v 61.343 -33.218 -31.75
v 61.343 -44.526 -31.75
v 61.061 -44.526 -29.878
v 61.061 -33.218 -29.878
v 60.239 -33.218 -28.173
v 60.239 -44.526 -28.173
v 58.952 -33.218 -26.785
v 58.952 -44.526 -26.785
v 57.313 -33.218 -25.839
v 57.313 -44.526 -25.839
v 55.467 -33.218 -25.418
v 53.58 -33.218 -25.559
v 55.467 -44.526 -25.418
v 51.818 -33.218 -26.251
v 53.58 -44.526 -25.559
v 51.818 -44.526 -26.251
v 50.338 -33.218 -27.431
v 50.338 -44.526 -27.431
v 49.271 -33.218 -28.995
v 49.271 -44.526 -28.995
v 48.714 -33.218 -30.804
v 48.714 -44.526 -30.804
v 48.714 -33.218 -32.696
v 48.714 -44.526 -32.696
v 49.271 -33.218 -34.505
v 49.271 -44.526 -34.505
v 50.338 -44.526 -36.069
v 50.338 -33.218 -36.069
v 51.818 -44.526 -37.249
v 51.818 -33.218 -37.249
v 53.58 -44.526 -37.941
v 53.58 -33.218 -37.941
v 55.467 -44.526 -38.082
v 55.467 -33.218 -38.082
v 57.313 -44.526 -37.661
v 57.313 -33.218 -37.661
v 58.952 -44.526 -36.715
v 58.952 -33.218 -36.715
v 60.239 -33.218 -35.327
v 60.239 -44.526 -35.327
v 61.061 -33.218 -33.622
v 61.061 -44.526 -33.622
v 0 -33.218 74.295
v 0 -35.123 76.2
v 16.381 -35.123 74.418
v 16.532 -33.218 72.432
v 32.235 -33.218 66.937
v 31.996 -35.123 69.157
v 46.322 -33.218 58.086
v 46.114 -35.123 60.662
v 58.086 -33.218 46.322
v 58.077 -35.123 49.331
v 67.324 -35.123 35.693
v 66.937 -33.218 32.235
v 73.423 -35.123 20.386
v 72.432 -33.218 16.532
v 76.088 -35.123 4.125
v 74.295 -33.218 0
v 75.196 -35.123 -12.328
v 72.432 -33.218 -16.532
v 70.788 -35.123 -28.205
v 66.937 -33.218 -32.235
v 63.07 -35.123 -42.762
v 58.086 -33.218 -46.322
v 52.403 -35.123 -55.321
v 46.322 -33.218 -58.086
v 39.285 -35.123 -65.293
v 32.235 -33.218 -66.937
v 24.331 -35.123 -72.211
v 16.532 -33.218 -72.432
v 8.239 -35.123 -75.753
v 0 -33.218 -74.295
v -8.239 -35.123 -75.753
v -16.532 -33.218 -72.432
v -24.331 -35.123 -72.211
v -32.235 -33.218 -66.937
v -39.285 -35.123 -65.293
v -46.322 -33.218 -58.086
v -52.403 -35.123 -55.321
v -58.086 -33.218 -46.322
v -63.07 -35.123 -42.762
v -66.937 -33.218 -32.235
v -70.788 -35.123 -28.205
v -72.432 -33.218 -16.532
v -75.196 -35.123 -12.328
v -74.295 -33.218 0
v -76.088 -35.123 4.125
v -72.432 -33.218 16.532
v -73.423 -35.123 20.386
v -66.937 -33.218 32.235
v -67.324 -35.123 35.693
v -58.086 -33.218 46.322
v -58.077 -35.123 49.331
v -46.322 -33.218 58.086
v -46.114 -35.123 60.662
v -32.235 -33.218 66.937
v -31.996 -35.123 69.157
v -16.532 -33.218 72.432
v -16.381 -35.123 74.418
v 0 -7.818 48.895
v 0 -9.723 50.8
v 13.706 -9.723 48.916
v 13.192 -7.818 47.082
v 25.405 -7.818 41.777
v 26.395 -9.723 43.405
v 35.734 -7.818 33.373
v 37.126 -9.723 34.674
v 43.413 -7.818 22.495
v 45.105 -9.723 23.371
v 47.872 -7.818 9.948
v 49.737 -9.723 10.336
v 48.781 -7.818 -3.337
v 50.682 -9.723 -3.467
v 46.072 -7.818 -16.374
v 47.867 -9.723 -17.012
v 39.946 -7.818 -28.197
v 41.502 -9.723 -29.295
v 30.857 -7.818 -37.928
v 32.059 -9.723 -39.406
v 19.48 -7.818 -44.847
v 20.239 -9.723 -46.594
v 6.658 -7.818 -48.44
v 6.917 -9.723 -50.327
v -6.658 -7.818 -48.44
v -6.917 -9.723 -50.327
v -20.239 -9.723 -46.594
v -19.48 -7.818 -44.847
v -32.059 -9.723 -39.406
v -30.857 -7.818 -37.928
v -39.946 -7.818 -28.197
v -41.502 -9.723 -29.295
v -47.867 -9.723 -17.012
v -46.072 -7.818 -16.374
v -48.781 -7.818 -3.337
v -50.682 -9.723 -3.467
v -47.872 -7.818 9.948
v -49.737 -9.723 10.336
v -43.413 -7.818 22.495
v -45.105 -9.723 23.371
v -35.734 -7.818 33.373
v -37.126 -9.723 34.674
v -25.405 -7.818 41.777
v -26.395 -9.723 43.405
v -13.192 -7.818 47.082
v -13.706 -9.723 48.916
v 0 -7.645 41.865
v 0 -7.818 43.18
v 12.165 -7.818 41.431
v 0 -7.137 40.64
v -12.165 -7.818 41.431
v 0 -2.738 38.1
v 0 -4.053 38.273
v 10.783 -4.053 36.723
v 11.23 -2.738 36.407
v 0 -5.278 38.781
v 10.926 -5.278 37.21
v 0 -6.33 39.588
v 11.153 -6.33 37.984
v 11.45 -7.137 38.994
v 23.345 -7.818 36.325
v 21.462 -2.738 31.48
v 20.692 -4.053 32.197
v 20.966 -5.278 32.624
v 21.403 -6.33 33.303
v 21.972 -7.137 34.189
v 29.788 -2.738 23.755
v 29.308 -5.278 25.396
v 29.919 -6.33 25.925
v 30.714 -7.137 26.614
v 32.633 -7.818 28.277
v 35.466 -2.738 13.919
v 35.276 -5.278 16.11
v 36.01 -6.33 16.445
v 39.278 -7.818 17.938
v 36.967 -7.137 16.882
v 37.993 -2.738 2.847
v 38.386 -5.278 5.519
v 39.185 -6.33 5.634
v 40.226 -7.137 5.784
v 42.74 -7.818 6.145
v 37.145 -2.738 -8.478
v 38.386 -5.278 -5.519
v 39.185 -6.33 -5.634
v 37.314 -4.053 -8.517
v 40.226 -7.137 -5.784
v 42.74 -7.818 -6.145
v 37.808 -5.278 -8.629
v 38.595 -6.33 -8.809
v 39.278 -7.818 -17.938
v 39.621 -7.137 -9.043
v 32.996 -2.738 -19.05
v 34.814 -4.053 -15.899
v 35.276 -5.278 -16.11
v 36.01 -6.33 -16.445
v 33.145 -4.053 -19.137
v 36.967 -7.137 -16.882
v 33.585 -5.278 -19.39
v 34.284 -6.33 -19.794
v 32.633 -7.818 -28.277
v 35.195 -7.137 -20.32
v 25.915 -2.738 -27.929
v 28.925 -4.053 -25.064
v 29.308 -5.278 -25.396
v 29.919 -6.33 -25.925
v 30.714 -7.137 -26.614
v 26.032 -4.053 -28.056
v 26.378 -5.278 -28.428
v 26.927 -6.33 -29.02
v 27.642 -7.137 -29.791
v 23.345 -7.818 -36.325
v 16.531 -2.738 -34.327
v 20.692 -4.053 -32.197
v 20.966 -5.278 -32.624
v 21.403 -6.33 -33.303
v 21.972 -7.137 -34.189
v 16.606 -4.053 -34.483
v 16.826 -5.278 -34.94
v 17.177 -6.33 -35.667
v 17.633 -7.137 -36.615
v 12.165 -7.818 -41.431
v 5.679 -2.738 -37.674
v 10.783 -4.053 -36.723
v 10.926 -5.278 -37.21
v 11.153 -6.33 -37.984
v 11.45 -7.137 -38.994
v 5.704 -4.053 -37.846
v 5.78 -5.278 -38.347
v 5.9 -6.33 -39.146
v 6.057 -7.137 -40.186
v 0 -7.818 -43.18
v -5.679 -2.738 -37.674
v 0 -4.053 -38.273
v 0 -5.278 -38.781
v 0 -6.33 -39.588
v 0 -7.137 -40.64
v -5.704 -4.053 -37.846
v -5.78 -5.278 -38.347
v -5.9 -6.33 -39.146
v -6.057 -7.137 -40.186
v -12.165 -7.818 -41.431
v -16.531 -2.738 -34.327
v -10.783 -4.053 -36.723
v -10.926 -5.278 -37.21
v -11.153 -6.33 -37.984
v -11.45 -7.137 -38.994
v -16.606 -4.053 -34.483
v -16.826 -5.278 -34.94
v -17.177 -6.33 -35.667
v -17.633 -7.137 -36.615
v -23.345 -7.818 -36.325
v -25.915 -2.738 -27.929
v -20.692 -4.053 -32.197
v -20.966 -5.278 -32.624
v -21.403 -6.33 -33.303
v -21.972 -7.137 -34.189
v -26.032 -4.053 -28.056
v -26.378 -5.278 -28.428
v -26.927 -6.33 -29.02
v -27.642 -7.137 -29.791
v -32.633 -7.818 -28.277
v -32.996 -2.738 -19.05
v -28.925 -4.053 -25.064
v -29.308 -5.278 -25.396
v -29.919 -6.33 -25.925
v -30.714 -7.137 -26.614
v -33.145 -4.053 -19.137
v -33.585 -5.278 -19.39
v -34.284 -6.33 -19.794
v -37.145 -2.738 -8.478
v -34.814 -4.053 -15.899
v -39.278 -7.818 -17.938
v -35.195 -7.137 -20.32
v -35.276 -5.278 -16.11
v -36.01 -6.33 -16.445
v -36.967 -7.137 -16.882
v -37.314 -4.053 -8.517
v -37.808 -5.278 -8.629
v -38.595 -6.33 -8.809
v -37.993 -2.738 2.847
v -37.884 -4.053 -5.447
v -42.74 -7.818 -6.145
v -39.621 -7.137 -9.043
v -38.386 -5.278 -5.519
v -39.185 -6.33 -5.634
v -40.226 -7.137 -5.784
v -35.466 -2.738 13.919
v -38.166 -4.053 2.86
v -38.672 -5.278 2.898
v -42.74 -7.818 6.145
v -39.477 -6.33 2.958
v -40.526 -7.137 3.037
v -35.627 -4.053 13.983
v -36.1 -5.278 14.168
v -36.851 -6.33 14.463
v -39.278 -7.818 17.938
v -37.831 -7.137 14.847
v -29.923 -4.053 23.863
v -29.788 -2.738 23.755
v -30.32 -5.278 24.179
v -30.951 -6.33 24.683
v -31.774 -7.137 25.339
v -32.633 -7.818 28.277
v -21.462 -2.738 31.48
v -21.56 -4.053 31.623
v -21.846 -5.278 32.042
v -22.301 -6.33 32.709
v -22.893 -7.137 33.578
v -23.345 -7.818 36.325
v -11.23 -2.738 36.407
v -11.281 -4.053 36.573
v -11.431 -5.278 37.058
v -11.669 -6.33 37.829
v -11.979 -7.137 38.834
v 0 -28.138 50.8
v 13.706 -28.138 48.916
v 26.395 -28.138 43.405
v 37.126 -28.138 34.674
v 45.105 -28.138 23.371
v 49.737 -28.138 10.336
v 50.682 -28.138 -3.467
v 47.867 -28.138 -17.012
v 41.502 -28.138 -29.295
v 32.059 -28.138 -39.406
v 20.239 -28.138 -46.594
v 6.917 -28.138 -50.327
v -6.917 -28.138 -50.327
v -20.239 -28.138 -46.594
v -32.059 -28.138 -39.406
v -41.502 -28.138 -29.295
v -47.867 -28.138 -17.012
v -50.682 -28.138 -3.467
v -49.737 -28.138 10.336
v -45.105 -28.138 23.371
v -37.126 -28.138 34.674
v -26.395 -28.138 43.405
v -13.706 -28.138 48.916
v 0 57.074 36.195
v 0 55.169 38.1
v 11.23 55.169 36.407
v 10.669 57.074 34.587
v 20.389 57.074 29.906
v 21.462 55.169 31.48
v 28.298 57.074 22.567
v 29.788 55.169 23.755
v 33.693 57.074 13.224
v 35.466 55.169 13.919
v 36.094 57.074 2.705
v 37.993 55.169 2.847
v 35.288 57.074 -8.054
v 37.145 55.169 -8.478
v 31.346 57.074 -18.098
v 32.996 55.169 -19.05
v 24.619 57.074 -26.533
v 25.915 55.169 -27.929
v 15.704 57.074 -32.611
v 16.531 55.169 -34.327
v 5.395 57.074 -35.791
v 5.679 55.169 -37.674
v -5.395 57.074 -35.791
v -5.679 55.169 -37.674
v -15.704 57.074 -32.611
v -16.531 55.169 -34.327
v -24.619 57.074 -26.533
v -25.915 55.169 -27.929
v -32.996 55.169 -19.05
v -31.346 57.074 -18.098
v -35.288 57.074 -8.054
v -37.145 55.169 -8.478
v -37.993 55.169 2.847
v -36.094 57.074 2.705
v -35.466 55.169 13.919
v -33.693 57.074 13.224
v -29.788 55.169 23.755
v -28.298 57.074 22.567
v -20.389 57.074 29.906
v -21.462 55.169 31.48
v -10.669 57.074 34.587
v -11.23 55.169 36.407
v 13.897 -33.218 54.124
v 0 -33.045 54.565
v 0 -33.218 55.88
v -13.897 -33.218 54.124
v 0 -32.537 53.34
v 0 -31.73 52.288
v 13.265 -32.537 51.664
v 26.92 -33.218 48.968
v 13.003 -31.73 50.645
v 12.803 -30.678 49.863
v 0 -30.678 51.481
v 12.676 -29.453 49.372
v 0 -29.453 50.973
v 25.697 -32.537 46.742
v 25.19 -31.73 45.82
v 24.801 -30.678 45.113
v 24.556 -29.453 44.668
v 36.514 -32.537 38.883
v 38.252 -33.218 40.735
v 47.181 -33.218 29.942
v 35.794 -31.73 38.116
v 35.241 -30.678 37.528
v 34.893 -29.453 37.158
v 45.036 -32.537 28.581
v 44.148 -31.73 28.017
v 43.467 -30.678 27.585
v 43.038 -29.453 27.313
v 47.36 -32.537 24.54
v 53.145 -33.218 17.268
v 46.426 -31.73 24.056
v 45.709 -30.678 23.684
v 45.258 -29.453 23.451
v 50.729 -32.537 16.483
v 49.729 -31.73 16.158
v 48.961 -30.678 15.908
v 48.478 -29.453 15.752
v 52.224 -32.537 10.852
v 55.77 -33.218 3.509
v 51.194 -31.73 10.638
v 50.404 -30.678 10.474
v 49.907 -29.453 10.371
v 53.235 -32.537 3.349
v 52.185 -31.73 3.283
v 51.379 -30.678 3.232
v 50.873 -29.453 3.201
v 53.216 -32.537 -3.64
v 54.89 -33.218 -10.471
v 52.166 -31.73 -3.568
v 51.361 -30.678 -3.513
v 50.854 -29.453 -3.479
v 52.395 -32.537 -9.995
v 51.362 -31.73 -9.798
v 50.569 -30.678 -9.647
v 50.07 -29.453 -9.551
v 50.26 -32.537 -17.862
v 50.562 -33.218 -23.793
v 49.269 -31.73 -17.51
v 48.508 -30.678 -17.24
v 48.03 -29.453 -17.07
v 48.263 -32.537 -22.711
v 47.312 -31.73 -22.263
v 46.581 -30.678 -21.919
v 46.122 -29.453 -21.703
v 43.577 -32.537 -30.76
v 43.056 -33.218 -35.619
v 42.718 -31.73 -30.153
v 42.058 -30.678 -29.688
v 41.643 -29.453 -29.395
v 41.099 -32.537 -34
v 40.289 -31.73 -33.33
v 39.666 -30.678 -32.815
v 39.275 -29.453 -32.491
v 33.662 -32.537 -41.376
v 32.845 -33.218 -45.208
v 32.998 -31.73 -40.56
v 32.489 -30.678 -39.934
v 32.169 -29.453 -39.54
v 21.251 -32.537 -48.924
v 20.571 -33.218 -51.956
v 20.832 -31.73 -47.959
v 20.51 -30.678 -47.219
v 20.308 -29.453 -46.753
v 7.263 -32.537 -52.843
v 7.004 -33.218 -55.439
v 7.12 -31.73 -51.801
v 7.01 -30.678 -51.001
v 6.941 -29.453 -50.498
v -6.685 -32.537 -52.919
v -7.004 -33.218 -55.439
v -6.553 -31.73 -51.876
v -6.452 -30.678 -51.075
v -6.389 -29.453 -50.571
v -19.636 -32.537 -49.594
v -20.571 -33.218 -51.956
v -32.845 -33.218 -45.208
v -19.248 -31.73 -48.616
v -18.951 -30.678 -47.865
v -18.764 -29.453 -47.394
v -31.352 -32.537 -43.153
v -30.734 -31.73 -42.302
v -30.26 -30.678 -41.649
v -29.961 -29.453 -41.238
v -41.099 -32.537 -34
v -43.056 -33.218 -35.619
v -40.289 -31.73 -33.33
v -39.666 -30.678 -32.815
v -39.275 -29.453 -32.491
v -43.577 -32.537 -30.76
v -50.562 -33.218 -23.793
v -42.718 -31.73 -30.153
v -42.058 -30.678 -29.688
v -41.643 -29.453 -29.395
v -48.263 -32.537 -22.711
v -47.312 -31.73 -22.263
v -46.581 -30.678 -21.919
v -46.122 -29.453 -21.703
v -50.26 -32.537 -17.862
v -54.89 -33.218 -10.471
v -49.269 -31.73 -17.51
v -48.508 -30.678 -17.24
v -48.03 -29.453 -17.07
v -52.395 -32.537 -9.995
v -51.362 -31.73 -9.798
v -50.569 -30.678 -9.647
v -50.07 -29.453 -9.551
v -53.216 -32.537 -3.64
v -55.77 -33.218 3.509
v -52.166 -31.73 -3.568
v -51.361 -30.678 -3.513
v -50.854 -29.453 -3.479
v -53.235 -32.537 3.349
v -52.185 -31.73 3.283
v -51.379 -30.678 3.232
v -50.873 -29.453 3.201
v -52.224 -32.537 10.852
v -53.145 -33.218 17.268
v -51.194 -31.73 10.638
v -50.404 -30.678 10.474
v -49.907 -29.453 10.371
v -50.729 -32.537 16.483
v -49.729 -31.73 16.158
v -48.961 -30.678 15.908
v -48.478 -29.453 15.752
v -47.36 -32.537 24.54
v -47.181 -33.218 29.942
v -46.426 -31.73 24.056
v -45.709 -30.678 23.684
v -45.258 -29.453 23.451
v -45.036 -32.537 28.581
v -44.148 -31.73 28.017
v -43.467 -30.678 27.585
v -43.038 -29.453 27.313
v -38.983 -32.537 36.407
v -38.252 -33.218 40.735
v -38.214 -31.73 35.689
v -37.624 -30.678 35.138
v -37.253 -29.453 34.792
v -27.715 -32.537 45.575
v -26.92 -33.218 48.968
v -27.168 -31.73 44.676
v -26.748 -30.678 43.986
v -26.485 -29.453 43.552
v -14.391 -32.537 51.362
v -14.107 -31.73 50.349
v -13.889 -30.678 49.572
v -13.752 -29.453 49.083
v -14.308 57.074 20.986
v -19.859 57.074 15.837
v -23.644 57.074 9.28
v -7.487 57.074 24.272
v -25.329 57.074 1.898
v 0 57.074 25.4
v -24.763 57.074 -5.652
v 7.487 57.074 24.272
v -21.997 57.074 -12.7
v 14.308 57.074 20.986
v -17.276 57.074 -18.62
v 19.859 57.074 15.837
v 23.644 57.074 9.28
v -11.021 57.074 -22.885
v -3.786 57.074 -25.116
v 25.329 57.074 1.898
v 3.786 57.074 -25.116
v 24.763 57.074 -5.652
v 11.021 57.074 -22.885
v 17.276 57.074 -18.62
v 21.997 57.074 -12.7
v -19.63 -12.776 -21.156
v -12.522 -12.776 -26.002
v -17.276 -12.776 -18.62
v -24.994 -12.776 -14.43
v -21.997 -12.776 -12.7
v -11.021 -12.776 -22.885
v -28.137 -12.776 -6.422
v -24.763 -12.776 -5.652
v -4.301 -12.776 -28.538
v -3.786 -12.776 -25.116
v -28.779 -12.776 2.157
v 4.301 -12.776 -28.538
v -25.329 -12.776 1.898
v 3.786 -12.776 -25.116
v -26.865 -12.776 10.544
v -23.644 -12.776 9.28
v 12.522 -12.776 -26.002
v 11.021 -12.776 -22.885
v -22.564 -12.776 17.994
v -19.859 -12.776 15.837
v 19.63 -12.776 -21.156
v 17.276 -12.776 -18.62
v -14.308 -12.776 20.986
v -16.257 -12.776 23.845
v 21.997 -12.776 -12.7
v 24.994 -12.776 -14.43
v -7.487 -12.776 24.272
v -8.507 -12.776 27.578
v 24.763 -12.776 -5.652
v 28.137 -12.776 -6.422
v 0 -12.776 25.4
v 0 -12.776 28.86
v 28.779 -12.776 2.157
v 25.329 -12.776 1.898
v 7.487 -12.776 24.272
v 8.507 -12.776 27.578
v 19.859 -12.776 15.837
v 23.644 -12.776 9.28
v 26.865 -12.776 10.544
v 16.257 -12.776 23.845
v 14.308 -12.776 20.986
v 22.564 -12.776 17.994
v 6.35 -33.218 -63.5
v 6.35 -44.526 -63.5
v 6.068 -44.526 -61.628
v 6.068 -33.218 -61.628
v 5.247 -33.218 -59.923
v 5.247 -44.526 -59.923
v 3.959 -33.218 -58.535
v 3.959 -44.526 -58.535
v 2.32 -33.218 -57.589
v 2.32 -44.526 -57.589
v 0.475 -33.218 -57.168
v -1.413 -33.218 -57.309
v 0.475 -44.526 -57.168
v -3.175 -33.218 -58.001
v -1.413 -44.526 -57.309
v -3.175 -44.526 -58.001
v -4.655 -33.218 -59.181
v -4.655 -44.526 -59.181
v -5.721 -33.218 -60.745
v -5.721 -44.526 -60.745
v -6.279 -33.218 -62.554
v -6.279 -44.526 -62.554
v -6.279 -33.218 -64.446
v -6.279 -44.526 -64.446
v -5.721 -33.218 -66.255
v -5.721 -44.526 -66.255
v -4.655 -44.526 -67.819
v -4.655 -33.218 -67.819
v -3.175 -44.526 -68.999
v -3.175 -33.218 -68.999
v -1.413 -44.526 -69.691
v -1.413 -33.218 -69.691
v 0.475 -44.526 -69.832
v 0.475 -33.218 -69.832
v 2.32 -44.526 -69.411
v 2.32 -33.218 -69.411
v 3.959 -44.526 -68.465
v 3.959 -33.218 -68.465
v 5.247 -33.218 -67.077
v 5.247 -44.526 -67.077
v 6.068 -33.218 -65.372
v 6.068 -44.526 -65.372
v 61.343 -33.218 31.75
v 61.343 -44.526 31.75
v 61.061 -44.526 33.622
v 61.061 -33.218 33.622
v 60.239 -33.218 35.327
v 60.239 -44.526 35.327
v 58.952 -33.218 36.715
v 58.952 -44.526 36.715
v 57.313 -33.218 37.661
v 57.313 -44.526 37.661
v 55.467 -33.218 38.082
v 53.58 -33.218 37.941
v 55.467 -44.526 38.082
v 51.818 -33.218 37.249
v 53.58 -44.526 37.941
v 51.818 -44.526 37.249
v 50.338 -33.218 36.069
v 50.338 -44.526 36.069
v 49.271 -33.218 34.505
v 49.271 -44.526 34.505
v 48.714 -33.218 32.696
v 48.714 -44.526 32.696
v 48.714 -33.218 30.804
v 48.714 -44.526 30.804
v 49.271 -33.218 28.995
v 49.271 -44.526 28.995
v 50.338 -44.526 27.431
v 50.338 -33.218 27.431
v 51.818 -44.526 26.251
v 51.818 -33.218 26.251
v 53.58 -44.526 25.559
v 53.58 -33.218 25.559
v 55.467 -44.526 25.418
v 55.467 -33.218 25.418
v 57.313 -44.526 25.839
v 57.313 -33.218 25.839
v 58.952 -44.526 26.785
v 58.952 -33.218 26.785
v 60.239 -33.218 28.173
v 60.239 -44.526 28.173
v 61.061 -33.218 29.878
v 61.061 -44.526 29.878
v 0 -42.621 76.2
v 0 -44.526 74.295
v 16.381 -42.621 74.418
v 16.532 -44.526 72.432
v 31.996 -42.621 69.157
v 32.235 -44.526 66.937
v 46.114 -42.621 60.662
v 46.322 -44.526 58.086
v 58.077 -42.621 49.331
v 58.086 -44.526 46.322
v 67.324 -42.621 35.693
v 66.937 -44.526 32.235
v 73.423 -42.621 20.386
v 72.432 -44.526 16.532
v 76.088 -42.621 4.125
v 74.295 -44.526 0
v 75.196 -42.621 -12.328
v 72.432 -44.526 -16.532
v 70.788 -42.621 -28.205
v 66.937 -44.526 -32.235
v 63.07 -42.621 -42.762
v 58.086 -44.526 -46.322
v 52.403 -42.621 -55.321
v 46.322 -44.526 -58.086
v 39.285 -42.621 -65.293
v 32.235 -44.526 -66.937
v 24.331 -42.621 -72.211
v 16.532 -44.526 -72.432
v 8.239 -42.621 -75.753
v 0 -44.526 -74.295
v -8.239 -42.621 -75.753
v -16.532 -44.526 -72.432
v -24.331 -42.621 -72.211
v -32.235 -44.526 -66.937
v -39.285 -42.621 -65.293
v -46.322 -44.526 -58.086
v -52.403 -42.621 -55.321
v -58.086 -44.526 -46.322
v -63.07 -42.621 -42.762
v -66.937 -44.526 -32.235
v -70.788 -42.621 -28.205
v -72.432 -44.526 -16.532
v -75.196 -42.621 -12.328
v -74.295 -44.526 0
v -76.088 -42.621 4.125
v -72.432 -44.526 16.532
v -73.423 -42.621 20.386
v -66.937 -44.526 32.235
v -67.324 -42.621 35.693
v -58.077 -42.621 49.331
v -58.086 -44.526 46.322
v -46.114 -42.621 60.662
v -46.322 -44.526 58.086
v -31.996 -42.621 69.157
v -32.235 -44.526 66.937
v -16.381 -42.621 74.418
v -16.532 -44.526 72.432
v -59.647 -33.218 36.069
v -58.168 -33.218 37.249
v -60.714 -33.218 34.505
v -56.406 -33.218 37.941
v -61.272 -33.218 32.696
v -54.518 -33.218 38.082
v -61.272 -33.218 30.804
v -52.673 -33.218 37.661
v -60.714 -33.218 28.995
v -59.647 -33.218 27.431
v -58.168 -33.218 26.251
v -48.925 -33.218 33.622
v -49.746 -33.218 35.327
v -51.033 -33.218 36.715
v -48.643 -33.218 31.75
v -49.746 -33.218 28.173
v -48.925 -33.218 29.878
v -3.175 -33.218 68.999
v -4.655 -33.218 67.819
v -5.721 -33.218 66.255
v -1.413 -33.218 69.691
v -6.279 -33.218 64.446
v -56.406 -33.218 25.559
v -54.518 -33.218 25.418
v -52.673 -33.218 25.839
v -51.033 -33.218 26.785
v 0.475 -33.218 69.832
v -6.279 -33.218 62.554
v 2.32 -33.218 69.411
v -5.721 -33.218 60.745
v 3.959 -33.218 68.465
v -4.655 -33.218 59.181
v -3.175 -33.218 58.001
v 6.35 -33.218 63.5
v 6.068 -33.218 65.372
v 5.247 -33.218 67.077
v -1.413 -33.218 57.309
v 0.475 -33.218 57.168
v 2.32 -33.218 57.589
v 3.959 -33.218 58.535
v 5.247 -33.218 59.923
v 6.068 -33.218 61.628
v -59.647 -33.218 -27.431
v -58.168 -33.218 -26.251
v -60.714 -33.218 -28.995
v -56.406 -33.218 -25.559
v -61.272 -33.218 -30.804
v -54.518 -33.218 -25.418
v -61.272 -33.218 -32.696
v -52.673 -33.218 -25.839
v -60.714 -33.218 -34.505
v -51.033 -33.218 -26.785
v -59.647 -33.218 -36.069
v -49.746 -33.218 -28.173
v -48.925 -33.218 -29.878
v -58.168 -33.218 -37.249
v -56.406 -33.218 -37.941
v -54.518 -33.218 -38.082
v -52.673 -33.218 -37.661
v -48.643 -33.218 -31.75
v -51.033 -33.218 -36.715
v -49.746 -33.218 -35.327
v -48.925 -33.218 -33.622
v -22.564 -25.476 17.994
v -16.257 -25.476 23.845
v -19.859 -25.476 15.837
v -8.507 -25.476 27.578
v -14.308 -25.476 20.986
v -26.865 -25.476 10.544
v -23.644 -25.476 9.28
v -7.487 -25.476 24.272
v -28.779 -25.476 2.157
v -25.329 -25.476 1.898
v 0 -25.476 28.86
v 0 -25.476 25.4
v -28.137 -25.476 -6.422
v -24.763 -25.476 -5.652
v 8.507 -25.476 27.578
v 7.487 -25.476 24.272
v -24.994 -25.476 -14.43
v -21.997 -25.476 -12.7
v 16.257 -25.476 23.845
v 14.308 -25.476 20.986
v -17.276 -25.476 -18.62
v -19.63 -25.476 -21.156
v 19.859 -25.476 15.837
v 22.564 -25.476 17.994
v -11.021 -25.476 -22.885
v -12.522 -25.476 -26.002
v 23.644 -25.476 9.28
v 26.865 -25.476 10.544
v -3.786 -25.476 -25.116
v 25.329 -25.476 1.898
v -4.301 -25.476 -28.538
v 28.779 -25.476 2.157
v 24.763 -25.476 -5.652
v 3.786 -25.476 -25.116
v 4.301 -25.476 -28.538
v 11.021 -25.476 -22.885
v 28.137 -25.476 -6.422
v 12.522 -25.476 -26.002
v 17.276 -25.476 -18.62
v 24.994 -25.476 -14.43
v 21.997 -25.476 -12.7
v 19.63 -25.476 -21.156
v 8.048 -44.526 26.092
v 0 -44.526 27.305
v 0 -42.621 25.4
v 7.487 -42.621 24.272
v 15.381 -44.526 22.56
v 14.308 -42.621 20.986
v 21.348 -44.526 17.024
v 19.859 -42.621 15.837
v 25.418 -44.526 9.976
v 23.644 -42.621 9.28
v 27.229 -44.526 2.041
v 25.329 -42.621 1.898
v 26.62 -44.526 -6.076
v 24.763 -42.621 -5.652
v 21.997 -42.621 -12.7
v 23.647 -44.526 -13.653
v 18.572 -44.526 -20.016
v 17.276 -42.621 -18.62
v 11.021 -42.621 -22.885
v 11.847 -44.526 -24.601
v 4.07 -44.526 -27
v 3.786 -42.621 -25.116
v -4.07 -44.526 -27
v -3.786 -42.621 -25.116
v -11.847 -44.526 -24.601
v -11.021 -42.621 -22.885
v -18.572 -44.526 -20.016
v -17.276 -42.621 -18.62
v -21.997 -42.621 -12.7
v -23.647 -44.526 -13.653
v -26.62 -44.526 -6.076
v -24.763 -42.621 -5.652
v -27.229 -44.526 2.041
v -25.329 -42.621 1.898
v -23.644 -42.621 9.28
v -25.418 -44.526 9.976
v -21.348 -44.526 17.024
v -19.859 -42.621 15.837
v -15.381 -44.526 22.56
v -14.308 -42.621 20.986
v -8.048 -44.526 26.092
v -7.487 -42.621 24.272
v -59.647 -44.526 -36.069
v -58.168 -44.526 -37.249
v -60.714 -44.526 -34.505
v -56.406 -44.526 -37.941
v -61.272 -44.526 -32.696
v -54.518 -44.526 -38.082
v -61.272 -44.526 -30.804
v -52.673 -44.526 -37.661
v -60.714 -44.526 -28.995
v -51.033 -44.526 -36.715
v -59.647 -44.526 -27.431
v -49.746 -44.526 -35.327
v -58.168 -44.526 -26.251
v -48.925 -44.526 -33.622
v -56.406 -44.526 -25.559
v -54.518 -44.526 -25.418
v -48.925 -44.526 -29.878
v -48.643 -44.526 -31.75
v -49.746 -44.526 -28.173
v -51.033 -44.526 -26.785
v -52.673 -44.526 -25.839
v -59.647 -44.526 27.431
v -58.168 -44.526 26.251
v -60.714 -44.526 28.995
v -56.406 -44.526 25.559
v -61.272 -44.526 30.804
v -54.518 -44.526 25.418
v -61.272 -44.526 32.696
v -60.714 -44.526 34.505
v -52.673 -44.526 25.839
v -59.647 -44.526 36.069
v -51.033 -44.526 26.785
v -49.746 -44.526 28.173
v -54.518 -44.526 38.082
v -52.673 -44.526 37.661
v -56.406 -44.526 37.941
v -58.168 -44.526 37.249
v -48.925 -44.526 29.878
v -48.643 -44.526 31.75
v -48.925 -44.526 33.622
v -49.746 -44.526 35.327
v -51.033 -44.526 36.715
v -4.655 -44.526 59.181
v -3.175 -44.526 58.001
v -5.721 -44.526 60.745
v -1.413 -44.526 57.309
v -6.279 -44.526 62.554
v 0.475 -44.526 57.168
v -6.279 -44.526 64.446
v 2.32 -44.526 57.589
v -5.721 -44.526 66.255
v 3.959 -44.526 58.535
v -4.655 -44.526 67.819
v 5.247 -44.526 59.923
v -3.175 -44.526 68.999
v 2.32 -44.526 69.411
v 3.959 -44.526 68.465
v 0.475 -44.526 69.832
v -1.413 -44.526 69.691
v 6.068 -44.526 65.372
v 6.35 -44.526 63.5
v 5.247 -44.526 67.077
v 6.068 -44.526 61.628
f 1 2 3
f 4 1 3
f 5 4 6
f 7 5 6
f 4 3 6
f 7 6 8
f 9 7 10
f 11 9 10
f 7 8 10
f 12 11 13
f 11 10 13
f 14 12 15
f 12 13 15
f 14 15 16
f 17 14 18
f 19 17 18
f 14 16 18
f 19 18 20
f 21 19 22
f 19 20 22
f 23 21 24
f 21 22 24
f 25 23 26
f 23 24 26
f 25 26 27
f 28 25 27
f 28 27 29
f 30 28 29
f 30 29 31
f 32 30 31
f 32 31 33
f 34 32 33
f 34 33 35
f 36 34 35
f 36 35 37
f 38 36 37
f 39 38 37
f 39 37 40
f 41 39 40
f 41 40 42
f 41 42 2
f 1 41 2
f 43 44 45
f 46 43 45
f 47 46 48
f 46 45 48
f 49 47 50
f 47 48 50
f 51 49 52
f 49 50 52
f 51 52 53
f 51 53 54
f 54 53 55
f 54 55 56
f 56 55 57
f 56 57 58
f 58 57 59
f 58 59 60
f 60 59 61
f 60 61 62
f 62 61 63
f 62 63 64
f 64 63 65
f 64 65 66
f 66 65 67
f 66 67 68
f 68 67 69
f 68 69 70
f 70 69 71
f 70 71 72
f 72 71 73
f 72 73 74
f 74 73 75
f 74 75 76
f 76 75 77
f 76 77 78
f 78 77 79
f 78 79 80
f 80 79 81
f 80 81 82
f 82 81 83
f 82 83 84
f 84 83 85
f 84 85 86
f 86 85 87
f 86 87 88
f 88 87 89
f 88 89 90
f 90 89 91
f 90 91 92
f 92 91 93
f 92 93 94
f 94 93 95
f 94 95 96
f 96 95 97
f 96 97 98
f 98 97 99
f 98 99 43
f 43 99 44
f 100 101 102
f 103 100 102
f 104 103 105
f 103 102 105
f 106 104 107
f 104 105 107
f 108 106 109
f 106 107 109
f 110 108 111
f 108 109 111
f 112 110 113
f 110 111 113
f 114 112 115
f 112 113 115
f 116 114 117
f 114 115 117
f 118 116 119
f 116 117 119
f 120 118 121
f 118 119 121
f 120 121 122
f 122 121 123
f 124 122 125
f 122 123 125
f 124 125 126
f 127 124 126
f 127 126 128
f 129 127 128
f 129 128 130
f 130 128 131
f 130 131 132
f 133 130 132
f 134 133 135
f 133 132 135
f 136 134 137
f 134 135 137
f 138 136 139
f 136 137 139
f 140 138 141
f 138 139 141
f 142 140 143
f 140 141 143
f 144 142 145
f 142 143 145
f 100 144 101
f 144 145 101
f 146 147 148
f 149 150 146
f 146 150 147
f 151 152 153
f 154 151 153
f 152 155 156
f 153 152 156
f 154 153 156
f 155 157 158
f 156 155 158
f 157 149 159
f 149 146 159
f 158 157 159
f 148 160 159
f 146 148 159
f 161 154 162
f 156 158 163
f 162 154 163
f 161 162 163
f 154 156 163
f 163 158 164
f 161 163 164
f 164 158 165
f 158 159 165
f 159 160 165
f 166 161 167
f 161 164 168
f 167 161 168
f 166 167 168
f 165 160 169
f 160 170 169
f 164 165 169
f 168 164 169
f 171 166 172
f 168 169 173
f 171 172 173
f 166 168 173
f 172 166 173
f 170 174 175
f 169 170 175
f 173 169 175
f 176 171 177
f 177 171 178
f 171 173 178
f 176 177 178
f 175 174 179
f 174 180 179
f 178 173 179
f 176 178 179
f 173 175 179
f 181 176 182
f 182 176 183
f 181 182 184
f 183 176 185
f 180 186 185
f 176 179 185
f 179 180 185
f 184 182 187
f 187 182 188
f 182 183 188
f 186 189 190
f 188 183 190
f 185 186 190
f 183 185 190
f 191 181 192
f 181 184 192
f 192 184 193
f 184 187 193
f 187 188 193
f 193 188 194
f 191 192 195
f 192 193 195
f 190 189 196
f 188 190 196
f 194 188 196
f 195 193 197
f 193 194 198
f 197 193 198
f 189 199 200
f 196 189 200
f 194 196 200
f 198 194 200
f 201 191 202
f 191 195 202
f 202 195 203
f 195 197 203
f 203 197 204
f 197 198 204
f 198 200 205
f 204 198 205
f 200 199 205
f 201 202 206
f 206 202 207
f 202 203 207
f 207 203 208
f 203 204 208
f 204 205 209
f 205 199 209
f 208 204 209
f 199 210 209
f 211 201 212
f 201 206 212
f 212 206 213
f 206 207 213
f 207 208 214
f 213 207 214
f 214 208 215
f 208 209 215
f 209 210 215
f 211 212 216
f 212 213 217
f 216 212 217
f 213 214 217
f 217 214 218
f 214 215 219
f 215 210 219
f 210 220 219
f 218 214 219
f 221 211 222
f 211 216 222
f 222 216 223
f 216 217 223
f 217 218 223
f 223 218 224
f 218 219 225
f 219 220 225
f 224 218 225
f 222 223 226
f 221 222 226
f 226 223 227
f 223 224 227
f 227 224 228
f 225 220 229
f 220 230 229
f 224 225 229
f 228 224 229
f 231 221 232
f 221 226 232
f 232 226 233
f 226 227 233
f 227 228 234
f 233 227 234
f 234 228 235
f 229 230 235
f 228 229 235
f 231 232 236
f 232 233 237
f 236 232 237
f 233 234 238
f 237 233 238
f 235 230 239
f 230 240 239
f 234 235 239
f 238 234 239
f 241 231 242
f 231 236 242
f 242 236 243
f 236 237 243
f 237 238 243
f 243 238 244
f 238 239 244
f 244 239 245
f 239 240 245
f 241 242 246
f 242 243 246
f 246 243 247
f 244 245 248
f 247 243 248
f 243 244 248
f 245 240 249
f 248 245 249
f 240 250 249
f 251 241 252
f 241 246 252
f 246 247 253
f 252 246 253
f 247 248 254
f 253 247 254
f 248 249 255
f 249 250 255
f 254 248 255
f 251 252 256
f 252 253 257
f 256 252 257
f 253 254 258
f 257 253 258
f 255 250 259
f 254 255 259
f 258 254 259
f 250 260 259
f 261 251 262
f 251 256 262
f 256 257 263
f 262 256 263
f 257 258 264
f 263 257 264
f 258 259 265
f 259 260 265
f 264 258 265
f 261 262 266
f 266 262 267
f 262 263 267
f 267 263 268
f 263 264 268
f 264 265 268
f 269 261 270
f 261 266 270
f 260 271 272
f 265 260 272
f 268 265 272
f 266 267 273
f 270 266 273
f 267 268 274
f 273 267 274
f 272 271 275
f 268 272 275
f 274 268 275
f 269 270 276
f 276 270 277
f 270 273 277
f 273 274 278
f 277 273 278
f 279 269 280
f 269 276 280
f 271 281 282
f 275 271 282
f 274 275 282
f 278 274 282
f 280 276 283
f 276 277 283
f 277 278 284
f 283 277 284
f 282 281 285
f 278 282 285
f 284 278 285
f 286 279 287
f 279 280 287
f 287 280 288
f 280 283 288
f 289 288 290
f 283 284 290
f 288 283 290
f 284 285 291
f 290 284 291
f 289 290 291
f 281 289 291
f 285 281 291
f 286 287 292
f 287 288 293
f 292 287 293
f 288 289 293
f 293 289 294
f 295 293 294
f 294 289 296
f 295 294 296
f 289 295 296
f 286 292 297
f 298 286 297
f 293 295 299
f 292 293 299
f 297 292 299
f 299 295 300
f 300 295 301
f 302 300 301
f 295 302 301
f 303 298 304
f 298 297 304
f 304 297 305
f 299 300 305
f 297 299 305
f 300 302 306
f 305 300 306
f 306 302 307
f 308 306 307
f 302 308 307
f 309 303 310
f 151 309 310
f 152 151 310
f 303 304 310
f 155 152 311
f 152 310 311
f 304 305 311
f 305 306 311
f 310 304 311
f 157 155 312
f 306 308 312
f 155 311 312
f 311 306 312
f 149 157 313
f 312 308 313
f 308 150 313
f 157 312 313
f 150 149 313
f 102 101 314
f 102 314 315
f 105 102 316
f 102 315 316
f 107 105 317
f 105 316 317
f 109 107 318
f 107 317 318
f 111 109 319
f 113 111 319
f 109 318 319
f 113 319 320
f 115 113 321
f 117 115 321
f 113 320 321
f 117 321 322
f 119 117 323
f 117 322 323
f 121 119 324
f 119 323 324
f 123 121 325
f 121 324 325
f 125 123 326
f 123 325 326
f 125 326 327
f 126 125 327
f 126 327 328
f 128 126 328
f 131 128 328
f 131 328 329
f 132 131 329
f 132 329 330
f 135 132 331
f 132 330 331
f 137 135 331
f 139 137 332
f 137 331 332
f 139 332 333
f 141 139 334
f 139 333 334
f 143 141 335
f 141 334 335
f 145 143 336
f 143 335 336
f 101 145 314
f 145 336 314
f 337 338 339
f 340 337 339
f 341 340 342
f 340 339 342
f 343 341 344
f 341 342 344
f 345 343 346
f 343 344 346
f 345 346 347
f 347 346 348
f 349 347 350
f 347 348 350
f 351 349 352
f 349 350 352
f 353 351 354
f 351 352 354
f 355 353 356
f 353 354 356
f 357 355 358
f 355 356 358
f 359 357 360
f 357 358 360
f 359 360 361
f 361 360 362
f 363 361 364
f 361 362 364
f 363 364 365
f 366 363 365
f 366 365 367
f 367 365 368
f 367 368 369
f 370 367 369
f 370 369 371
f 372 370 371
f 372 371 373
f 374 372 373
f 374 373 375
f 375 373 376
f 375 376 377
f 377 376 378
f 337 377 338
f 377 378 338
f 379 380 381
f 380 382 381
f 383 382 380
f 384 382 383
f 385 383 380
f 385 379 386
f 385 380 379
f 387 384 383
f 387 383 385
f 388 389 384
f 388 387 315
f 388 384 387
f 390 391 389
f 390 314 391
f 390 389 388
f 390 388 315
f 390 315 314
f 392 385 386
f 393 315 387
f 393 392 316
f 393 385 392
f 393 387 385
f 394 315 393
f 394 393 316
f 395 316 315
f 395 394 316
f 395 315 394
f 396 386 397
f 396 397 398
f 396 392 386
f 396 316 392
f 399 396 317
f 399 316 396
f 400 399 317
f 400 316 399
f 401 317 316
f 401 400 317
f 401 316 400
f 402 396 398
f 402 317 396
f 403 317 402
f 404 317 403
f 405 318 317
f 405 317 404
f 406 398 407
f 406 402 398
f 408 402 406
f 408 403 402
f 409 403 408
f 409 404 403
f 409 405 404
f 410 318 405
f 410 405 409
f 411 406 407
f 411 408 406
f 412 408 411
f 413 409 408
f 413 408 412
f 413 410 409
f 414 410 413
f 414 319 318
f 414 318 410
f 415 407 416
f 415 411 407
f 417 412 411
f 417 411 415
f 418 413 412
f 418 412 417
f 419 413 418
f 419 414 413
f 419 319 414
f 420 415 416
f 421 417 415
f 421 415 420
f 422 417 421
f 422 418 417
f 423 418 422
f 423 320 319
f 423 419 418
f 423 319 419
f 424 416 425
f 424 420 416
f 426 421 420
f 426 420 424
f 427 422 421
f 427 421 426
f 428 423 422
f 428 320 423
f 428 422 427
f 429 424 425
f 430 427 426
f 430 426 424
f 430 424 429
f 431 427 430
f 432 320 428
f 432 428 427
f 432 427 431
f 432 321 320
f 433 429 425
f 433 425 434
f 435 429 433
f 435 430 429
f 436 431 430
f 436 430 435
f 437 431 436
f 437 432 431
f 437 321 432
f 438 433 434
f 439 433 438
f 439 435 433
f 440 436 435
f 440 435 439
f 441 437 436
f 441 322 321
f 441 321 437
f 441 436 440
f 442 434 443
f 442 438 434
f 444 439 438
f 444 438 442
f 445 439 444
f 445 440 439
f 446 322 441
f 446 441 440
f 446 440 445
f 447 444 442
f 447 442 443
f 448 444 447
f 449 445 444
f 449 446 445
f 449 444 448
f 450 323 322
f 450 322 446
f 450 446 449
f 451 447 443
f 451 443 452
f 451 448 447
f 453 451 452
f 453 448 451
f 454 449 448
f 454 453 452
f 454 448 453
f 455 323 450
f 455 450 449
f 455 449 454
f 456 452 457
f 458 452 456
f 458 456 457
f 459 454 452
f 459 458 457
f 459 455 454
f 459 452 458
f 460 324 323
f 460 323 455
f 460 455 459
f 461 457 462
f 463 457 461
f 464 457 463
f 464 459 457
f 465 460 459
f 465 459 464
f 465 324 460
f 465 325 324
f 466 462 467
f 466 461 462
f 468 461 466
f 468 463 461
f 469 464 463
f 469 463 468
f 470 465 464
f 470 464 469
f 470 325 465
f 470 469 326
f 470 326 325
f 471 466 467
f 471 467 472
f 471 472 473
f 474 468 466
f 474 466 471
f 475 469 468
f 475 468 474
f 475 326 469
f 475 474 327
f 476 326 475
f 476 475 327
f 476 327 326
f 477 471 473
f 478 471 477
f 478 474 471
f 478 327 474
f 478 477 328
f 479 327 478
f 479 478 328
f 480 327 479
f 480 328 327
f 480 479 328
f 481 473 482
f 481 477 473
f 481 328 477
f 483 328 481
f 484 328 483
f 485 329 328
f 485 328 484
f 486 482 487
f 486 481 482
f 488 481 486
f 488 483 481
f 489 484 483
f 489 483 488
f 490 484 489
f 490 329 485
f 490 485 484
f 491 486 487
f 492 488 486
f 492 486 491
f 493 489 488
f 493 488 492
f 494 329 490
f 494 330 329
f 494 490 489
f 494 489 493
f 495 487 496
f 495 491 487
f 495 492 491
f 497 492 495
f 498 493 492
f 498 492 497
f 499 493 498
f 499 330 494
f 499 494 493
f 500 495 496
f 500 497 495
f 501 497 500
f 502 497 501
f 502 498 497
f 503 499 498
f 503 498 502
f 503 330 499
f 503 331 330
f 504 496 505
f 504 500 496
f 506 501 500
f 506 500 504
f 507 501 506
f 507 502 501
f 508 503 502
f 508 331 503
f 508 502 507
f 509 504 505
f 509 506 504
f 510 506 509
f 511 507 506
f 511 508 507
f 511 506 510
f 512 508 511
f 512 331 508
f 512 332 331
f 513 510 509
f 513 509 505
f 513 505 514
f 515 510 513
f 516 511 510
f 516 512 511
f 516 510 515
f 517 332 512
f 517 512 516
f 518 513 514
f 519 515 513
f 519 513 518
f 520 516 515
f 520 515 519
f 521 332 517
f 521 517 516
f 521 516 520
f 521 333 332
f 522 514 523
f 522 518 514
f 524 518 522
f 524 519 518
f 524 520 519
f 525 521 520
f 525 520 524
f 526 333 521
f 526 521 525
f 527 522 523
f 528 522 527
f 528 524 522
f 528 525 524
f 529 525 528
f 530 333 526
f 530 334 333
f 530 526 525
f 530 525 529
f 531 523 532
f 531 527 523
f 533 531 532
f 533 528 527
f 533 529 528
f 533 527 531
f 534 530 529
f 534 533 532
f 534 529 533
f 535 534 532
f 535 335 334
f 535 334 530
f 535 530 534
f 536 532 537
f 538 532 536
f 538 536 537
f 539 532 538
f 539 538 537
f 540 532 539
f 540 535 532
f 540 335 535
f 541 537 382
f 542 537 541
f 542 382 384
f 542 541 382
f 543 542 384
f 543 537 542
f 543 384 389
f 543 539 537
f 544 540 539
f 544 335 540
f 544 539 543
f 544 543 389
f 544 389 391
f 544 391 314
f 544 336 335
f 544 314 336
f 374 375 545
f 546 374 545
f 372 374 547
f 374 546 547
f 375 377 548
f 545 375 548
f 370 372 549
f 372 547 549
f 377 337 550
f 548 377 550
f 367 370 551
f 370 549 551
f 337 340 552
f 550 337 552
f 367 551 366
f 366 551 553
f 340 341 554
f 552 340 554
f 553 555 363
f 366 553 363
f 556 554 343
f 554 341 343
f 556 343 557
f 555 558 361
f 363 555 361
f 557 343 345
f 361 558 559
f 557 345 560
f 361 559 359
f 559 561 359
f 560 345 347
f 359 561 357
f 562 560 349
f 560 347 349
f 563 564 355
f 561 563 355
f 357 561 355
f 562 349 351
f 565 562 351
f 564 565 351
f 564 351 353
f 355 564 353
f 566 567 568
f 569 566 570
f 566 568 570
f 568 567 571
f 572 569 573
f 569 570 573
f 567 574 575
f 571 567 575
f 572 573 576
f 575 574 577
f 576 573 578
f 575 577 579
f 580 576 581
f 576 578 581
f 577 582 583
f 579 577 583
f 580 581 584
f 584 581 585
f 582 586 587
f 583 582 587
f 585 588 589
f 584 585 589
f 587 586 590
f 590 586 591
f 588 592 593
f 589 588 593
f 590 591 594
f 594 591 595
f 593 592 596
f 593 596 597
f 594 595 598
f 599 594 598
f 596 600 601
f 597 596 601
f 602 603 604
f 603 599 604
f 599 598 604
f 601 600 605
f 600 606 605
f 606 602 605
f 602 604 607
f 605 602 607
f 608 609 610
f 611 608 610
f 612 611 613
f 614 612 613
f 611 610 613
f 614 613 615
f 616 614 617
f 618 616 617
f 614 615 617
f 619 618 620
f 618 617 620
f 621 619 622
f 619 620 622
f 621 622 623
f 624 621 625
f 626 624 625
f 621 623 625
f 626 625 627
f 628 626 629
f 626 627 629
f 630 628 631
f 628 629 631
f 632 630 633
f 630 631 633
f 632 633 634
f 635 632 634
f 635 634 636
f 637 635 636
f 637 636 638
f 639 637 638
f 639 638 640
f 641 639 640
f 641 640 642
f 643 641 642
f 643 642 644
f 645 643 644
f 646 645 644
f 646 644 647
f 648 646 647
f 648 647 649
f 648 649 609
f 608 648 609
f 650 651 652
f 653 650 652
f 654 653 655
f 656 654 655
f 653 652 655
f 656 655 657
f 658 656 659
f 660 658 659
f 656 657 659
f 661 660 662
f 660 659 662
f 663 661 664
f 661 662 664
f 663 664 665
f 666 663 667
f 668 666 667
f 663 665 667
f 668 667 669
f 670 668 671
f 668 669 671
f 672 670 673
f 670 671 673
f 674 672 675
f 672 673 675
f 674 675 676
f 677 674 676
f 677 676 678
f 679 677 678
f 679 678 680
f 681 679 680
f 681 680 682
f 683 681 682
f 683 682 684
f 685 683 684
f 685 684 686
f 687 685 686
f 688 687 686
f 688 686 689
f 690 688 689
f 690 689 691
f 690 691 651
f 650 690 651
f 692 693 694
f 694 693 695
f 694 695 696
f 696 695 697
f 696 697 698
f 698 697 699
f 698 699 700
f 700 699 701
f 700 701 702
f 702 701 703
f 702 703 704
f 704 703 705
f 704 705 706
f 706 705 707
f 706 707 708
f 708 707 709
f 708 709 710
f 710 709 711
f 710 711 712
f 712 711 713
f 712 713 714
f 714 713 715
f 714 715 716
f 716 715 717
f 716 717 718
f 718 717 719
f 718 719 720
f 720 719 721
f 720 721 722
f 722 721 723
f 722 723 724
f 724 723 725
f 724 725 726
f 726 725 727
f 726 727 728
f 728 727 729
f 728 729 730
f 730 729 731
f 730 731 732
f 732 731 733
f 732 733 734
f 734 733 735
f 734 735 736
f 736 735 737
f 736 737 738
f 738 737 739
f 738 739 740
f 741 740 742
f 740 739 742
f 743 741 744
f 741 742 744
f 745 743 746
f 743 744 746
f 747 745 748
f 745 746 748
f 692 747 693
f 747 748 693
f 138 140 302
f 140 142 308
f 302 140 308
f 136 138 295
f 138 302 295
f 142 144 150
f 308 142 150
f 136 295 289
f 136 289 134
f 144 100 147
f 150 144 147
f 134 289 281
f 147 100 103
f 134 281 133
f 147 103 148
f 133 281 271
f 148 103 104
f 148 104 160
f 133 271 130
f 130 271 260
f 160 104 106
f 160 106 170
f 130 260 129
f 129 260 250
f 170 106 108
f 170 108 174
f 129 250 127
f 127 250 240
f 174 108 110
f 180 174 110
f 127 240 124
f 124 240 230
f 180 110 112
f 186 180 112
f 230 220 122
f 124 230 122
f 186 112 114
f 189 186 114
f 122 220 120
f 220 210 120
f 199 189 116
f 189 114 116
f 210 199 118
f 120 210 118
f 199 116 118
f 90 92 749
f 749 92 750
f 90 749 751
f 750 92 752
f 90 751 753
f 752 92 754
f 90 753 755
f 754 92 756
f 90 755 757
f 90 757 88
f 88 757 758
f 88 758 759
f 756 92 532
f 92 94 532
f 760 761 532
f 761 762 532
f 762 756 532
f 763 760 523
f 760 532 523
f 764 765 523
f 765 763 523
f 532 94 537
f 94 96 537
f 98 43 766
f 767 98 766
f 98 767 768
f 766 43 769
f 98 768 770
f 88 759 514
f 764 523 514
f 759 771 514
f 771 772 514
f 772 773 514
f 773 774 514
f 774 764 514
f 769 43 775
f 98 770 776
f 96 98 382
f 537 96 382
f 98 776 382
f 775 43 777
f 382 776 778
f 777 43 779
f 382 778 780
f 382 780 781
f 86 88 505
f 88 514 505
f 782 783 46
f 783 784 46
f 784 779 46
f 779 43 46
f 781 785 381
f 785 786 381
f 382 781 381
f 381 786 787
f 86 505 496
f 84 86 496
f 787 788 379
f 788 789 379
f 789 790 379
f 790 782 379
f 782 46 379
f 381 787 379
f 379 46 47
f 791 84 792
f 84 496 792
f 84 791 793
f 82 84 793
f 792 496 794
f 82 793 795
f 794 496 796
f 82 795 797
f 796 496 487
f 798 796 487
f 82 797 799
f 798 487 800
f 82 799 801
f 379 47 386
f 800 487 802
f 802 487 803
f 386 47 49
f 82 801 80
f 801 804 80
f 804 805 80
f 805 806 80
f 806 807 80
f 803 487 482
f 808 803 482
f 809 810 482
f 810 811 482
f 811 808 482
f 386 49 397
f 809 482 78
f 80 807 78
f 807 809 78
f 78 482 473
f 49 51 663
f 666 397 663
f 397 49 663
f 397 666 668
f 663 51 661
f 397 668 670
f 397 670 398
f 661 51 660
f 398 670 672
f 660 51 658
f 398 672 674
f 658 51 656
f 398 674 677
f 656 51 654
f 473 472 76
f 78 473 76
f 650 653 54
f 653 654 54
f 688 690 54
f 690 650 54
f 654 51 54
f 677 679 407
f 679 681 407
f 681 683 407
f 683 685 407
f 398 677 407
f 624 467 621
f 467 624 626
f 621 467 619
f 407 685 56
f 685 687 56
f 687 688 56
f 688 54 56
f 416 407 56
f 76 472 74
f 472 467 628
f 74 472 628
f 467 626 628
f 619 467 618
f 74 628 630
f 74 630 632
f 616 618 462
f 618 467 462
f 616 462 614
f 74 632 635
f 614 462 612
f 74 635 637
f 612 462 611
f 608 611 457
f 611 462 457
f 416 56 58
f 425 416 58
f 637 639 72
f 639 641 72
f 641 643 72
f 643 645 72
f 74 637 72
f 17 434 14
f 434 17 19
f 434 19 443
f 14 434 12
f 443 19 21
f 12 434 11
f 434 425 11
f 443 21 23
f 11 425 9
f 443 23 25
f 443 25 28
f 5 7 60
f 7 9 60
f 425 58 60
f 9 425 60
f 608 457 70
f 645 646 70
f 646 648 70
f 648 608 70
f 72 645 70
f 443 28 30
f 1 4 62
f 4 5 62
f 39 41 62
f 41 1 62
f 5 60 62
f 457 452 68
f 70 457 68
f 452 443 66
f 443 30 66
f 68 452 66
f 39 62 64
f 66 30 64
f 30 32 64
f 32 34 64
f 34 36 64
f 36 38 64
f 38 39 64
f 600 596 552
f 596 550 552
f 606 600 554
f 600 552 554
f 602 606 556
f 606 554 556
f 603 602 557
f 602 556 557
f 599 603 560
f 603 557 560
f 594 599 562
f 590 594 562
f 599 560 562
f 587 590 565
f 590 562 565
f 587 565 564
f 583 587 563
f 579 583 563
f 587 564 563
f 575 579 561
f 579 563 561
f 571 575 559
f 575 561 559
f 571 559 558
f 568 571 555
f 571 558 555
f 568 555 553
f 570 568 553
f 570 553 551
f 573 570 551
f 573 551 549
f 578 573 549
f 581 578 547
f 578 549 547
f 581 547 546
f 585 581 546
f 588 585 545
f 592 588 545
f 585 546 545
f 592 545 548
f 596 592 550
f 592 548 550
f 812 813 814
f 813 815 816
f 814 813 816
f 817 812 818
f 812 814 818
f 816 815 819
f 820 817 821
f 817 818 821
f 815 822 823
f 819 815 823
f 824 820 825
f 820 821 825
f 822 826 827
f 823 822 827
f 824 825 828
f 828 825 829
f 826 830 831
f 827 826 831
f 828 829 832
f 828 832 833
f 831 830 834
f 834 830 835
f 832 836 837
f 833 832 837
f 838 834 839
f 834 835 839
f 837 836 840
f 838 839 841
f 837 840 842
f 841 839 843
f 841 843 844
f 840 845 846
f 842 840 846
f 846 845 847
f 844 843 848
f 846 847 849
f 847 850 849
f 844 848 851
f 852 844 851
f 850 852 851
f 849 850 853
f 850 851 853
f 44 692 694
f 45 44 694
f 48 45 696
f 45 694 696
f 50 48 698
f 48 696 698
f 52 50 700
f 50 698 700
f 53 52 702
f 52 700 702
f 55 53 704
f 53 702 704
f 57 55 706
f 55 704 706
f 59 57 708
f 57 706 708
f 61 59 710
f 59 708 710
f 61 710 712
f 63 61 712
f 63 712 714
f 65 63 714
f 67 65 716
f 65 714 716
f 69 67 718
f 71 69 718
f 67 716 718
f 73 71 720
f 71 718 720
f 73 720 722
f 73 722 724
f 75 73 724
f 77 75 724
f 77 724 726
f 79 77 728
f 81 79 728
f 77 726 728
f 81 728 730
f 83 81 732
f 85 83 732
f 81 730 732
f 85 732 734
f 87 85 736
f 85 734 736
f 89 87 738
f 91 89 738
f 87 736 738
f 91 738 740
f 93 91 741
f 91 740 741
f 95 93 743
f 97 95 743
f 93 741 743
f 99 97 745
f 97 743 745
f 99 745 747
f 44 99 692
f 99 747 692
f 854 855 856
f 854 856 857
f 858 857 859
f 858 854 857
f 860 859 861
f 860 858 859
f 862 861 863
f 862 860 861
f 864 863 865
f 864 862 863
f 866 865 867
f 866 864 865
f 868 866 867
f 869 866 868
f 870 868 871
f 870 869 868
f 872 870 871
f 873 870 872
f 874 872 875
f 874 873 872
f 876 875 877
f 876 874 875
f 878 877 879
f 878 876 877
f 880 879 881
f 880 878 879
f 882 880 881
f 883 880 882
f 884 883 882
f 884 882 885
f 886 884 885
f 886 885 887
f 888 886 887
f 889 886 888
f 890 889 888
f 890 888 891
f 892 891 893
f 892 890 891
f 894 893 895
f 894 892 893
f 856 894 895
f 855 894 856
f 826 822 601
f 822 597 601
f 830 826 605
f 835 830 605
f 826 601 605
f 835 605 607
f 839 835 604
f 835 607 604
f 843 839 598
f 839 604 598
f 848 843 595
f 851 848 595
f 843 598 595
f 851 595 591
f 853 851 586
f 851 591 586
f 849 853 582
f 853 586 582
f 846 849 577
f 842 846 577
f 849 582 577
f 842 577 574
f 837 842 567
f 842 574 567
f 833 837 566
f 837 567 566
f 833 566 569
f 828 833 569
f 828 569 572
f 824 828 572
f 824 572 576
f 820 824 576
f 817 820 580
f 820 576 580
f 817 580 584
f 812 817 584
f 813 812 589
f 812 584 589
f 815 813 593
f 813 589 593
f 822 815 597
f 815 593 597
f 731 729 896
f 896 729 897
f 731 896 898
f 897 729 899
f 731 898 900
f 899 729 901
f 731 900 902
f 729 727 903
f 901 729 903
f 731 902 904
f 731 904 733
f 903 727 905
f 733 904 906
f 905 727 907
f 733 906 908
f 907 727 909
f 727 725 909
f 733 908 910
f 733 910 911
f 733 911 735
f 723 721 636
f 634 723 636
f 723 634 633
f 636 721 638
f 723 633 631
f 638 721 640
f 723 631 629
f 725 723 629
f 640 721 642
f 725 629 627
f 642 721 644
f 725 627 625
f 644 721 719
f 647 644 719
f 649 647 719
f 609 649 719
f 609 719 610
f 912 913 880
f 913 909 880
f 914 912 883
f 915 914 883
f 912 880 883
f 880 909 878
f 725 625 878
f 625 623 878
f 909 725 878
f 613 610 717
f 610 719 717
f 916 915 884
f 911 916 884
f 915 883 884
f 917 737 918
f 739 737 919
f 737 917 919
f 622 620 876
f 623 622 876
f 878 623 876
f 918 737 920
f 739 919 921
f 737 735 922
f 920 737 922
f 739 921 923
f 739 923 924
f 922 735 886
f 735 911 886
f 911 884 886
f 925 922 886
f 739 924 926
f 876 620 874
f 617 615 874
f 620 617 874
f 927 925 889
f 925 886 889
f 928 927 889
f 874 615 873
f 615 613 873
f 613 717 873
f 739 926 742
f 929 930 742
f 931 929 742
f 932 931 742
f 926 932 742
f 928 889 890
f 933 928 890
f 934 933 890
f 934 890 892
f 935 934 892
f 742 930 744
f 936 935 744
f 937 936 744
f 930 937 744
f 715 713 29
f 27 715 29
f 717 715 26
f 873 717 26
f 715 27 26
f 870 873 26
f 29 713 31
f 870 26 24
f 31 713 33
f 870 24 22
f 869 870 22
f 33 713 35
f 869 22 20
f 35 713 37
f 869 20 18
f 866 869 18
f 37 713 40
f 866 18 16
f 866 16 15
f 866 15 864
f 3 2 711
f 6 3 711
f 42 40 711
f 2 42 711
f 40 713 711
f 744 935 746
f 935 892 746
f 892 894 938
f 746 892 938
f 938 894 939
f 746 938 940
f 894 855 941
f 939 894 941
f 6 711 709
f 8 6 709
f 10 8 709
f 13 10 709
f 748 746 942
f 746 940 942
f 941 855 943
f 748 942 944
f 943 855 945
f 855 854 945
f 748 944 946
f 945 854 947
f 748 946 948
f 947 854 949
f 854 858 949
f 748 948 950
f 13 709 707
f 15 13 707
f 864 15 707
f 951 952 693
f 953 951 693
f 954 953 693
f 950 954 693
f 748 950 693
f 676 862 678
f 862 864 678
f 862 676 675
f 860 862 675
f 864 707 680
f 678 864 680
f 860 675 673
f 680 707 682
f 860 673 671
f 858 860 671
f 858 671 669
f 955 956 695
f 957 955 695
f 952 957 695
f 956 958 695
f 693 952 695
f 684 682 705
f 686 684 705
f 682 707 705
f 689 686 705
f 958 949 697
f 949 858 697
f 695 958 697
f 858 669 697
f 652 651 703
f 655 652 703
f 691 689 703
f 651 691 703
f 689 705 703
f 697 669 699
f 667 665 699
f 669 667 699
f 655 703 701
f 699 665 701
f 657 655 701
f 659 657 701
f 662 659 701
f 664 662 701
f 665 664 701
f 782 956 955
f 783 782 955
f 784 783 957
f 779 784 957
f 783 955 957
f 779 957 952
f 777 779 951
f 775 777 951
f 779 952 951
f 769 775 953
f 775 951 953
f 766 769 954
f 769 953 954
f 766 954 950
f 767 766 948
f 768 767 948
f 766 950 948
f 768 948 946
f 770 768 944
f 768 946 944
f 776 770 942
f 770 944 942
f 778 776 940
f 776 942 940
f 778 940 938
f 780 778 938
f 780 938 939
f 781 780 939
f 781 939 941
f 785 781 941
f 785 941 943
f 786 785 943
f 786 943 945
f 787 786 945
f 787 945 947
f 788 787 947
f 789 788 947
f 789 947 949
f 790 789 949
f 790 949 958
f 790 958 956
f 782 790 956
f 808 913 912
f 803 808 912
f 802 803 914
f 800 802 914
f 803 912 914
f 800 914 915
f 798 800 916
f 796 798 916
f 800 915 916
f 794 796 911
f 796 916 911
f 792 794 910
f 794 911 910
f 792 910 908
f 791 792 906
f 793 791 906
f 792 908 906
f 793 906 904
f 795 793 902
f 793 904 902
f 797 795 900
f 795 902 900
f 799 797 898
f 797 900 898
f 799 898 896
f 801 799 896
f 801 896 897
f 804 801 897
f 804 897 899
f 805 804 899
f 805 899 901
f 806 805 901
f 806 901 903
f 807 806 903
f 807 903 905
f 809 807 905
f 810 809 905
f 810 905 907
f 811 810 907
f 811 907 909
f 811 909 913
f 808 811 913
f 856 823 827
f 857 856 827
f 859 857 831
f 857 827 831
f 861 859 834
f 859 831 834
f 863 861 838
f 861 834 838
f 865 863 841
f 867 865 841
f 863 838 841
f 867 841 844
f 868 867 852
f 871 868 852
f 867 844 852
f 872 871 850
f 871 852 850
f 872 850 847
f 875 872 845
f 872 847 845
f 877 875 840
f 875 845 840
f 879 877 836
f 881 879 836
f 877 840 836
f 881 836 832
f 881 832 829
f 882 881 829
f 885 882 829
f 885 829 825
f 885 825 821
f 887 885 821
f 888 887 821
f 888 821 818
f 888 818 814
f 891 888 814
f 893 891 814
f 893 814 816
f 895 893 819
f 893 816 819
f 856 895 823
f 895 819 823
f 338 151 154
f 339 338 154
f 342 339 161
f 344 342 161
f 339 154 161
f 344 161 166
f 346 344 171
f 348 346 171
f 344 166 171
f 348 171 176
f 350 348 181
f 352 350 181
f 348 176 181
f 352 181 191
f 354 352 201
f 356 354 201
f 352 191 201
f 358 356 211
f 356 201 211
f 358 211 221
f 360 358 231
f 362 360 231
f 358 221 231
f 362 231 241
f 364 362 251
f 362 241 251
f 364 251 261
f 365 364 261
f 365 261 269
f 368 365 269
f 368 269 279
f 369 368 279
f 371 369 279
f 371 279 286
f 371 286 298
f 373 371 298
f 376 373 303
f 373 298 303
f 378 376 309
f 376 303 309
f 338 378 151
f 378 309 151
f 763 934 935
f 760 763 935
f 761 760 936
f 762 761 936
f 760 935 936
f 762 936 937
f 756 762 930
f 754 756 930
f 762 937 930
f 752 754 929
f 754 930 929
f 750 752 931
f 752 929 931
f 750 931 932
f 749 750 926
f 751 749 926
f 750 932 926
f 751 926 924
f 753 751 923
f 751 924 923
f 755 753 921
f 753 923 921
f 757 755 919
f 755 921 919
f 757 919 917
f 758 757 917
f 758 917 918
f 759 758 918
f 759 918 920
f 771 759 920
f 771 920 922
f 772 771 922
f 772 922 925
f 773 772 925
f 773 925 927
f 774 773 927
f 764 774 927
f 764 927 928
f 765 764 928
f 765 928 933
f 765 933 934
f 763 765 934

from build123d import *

# Parameters (mm, degrees)
F3_SIZE  = 1.905
F4_R     = 5.08
F5_R     = 6.35
F6_DEPTH = 15.875


with BuildPart() as f1:
    # F0 (on Right) → F1 (revolve)
    with BuildSketch(Plane.YZ):
        Polygon((-44.526481, 38.1), (-44.526481, 25.4), (-25.476481, 25.4), (-25.476481, 28.860142), (-12.776481, 28.860142), (-12.776481, 25.4), (57.073519, 25.4), (57.073519, 38.1), (-7.818043, 38.1), (-7.818043, 50.8), (-33.218043, 50.8), (-33.218043, 76.2), (-44.526481, 76.2), align=None)
    revolve(axis=Axis((0, 16.093373, 0), (0, 1, 0)))

    # F3
    f3_edges = [f1.edges().sort_by_distance(p)[0] for p in [
        (0, -44.526481, -76.2),
        (0, -33.218043, -76.2),
        (0, -7.818043, -50.8),
        (0, 57.073519, -38.1),
        (0, -44.526481, -25.4),
    ]]
    chamfer(f3_edges, length=F3_SIZE)

    # F4
    f4_edges = [f1.edges().sort_by_distance(p)[0] for p in [
        (0, -33.218043, -50.8),
        (0, -7.818043, -38.1),
    ]]
    fillet(f4_edges, radius=F4_R)

    # F5 (on face) → F6 (cut)
    with BuildSketch(Plane.XZ.offset(44.526481)):
        with Locations((-54.992613, 31.75)):
            Circle(F5_R)
        with Locations((-54.992613, -31.75)):
            Circle(F5_R)
        with Locations((0, -63.5)):
            Circle(F5_R)
        with Locations((54.992613, -31.75)):
            Circle(F5_R)
        with Locations((54.992613, 31.75)):
            Circle(F5_R)
        with Locations((0, 63.5)):
            Circle(F5_R)
    extrude(amount=-F6_DEPTH, mode=Mode.SUBTRACT)


solid = f1.part
